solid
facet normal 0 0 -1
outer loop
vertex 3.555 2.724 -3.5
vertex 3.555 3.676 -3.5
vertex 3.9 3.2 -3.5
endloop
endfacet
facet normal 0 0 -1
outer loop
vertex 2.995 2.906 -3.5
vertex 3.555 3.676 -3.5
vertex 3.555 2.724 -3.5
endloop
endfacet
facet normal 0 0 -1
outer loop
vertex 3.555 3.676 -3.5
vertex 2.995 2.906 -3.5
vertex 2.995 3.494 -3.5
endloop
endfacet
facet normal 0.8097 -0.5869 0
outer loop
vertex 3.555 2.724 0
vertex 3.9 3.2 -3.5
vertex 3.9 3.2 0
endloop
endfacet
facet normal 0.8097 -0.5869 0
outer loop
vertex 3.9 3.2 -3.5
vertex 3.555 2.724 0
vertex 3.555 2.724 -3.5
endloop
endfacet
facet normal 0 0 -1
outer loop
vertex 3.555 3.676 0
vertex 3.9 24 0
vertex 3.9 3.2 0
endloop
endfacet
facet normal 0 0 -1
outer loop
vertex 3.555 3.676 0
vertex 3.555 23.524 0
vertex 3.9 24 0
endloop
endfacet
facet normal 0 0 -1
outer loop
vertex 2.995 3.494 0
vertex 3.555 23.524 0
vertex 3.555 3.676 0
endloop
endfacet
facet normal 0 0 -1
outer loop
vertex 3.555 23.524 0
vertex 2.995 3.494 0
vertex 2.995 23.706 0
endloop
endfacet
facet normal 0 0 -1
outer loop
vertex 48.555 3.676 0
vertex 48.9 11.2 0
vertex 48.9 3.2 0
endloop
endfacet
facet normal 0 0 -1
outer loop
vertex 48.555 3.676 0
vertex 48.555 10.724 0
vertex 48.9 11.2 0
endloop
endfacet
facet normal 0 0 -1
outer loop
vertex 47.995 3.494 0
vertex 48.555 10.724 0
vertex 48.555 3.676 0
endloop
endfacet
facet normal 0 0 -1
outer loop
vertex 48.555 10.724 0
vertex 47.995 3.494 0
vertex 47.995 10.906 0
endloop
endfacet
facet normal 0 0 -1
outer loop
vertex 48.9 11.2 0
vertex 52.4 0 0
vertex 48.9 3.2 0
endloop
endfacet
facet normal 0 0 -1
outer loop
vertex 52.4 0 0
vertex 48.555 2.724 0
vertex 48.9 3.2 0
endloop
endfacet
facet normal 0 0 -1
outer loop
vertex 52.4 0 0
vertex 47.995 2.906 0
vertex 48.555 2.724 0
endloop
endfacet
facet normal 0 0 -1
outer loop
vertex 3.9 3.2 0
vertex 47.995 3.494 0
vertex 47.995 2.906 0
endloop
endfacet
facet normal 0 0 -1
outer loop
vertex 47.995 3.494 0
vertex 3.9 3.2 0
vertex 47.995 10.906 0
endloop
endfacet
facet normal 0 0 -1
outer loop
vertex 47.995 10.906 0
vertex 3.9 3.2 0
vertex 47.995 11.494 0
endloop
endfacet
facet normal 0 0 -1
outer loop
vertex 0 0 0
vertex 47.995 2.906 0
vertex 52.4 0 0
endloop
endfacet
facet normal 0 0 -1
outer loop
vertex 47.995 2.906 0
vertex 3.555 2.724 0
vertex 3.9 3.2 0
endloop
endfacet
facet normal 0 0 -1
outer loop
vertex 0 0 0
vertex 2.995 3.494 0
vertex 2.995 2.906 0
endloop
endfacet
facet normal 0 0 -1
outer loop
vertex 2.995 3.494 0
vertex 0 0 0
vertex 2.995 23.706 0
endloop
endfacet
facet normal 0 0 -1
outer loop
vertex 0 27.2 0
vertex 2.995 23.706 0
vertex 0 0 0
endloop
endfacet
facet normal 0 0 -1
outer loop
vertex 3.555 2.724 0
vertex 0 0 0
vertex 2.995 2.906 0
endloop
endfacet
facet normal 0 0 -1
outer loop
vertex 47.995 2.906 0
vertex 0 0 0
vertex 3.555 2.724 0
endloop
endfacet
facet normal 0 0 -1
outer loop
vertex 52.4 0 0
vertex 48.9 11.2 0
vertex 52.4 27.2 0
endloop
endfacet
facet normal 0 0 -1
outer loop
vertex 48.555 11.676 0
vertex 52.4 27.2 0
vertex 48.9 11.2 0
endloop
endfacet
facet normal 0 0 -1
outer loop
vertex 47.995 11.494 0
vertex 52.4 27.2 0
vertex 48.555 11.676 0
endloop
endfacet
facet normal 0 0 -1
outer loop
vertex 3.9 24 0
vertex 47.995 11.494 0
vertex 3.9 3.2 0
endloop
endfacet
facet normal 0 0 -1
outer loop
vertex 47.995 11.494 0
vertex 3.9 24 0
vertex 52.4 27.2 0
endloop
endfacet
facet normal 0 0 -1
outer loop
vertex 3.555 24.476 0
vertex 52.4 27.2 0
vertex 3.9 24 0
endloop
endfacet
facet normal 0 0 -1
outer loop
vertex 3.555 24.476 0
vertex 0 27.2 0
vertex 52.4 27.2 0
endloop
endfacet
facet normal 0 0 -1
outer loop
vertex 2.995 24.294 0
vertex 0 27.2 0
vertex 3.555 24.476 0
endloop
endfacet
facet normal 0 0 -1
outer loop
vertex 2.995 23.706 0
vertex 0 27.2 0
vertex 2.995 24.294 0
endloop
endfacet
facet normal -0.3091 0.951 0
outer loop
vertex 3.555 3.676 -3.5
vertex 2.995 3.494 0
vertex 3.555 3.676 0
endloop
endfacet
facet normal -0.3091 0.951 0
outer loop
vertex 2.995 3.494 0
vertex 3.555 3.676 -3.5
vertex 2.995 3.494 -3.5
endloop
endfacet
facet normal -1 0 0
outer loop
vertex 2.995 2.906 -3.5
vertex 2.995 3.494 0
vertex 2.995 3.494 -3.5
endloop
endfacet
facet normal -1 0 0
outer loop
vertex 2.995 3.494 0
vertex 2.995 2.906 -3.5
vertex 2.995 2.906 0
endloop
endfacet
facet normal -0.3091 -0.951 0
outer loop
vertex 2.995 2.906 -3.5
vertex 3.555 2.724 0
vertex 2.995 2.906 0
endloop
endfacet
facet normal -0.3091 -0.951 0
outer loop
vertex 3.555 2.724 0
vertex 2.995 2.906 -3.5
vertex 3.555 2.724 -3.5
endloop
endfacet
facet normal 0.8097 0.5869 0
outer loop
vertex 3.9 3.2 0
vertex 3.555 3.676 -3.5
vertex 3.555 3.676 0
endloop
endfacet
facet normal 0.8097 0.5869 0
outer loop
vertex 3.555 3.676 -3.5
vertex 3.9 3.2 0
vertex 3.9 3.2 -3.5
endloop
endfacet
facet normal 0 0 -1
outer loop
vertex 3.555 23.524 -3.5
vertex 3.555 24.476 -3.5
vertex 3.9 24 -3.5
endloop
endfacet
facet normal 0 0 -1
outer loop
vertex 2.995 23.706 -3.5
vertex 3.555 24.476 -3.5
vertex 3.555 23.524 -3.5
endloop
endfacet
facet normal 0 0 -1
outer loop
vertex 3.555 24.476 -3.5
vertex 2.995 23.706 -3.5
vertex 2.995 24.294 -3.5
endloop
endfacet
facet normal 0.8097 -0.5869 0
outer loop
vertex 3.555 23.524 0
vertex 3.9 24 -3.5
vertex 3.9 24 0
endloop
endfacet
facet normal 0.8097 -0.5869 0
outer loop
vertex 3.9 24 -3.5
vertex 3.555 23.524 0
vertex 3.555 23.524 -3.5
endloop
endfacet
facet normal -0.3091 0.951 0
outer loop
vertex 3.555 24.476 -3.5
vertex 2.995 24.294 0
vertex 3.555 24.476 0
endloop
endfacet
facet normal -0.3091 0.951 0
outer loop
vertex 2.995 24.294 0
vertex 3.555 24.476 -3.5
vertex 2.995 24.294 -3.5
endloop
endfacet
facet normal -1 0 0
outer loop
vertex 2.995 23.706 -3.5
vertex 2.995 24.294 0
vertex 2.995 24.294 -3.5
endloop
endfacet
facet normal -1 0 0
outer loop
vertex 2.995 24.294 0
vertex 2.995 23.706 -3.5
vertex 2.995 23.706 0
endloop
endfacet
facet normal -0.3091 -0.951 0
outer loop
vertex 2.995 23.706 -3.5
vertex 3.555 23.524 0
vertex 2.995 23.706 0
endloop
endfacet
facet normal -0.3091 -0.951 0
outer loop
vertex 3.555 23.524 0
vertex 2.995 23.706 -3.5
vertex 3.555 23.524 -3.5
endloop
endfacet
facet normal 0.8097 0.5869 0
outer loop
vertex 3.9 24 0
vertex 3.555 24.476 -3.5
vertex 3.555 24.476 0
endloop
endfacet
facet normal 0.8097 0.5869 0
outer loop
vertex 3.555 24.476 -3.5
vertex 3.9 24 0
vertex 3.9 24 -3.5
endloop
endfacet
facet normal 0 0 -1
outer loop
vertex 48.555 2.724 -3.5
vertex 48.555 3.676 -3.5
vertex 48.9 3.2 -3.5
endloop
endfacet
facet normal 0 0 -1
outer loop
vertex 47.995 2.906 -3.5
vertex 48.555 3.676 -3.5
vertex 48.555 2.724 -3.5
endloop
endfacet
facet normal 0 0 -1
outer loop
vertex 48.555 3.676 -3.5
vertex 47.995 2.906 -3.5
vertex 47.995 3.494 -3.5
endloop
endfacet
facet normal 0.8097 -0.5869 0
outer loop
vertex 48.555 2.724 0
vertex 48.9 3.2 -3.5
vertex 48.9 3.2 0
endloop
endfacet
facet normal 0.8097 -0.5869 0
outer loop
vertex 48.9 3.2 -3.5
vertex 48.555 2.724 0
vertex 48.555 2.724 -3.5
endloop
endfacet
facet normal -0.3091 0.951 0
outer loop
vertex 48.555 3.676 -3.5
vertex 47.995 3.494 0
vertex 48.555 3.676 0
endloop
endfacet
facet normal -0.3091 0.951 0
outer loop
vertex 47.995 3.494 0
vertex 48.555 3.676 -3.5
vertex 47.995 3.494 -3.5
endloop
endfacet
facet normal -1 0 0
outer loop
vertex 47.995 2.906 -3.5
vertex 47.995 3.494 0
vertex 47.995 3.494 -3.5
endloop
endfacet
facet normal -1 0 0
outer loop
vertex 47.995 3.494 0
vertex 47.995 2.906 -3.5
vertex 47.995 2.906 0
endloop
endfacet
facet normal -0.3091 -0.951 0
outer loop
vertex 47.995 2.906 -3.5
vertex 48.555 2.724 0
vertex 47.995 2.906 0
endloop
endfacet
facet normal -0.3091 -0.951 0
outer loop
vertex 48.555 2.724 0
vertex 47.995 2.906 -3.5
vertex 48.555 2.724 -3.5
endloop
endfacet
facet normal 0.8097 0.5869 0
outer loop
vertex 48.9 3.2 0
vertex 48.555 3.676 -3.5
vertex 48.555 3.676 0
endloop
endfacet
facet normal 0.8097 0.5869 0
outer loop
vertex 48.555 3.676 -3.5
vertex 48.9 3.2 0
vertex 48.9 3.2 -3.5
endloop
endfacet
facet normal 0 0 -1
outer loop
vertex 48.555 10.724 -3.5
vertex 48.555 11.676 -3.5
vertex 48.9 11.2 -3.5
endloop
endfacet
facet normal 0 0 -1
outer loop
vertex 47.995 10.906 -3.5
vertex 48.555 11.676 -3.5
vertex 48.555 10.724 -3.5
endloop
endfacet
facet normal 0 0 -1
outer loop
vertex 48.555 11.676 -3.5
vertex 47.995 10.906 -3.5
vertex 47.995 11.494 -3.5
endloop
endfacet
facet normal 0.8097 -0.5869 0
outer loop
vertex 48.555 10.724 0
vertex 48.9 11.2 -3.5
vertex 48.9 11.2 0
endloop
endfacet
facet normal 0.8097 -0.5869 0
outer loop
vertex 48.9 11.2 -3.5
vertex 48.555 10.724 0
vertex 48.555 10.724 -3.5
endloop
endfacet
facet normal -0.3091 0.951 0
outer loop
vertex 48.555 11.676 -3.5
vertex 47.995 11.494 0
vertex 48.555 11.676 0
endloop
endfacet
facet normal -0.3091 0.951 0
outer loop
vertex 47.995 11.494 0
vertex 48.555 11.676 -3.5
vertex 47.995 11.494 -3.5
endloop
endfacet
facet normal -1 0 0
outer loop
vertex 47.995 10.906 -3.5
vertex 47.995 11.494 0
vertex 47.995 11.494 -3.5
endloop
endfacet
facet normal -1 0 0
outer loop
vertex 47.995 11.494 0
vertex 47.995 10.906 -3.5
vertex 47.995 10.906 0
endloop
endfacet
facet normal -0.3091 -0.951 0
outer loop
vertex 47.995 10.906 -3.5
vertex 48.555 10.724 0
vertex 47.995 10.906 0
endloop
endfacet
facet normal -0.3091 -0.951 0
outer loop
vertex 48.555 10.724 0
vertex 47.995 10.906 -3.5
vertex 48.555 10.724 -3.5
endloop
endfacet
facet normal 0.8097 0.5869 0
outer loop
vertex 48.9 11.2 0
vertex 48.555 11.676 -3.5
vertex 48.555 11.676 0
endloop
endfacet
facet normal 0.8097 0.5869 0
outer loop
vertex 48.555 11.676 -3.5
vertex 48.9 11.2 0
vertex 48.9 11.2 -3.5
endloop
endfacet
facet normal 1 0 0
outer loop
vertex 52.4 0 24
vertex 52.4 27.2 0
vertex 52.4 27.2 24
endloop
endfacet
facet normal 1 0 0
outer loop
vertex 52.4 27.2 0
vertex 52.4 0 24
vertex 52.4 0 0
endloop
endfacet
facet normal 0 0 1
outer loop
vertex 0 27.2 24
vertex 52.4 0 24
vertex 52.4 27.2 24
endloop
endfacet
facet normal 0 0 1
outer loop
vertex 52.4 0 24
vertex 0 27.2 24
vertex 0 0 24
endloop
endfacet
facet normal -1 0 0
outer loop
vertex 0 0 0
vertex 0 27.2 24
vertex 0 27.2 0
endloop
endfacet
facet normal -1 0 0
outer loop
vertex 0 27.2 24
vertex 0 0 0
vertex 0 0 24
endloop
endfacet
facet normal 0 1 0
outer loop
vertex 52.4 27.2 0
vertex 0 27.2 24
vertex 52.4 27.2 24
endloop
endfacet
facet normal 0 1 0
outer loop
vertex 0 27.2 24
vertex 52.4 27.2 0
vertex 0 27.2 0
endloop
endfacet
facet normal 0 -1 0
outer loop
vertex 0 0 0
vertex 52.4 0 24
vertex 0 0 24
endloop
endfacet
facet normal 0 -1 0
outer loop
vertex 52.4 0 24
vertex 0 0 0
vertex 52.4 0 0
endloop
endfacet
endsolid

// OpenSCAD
// file: psu_IRM-15-X_dimensions.scad
// 5V 3A IRM-15-5 dimensions 
psu_height = 24;
psu_width = 27.2;
psu_length = 52.4;
// main file
include<psu_IRM-15-X_dimensions.scad>;

eps = 0.01;

module PSU_IRM_15_X() {

    gray = [0.7, 0.7, 0.7];
    black = [0, 0, 0];

    pin_height = 3.5;
    module pin() {
        color(gray) {
            linear_extrude(height=pin_height) {
                circle(0.5);
            }
        }
    }

    module chassis() {
        color(black) {
            cube([psu_length, psu_width, psu_height]);
        }
    }
  

    chassis();
    // AC pins
    for (y = [3.2, 24]) {
        translate([3.4, y, -pin_height]) {
            pin();
        }
    }
    // DC pins
    for (y = [3.2, 11.2]) {
        translate([48.4, y, -pin_height]) {
            pin();
        }
    }
}

// Example usage:
PSU_IRM_15_X();
